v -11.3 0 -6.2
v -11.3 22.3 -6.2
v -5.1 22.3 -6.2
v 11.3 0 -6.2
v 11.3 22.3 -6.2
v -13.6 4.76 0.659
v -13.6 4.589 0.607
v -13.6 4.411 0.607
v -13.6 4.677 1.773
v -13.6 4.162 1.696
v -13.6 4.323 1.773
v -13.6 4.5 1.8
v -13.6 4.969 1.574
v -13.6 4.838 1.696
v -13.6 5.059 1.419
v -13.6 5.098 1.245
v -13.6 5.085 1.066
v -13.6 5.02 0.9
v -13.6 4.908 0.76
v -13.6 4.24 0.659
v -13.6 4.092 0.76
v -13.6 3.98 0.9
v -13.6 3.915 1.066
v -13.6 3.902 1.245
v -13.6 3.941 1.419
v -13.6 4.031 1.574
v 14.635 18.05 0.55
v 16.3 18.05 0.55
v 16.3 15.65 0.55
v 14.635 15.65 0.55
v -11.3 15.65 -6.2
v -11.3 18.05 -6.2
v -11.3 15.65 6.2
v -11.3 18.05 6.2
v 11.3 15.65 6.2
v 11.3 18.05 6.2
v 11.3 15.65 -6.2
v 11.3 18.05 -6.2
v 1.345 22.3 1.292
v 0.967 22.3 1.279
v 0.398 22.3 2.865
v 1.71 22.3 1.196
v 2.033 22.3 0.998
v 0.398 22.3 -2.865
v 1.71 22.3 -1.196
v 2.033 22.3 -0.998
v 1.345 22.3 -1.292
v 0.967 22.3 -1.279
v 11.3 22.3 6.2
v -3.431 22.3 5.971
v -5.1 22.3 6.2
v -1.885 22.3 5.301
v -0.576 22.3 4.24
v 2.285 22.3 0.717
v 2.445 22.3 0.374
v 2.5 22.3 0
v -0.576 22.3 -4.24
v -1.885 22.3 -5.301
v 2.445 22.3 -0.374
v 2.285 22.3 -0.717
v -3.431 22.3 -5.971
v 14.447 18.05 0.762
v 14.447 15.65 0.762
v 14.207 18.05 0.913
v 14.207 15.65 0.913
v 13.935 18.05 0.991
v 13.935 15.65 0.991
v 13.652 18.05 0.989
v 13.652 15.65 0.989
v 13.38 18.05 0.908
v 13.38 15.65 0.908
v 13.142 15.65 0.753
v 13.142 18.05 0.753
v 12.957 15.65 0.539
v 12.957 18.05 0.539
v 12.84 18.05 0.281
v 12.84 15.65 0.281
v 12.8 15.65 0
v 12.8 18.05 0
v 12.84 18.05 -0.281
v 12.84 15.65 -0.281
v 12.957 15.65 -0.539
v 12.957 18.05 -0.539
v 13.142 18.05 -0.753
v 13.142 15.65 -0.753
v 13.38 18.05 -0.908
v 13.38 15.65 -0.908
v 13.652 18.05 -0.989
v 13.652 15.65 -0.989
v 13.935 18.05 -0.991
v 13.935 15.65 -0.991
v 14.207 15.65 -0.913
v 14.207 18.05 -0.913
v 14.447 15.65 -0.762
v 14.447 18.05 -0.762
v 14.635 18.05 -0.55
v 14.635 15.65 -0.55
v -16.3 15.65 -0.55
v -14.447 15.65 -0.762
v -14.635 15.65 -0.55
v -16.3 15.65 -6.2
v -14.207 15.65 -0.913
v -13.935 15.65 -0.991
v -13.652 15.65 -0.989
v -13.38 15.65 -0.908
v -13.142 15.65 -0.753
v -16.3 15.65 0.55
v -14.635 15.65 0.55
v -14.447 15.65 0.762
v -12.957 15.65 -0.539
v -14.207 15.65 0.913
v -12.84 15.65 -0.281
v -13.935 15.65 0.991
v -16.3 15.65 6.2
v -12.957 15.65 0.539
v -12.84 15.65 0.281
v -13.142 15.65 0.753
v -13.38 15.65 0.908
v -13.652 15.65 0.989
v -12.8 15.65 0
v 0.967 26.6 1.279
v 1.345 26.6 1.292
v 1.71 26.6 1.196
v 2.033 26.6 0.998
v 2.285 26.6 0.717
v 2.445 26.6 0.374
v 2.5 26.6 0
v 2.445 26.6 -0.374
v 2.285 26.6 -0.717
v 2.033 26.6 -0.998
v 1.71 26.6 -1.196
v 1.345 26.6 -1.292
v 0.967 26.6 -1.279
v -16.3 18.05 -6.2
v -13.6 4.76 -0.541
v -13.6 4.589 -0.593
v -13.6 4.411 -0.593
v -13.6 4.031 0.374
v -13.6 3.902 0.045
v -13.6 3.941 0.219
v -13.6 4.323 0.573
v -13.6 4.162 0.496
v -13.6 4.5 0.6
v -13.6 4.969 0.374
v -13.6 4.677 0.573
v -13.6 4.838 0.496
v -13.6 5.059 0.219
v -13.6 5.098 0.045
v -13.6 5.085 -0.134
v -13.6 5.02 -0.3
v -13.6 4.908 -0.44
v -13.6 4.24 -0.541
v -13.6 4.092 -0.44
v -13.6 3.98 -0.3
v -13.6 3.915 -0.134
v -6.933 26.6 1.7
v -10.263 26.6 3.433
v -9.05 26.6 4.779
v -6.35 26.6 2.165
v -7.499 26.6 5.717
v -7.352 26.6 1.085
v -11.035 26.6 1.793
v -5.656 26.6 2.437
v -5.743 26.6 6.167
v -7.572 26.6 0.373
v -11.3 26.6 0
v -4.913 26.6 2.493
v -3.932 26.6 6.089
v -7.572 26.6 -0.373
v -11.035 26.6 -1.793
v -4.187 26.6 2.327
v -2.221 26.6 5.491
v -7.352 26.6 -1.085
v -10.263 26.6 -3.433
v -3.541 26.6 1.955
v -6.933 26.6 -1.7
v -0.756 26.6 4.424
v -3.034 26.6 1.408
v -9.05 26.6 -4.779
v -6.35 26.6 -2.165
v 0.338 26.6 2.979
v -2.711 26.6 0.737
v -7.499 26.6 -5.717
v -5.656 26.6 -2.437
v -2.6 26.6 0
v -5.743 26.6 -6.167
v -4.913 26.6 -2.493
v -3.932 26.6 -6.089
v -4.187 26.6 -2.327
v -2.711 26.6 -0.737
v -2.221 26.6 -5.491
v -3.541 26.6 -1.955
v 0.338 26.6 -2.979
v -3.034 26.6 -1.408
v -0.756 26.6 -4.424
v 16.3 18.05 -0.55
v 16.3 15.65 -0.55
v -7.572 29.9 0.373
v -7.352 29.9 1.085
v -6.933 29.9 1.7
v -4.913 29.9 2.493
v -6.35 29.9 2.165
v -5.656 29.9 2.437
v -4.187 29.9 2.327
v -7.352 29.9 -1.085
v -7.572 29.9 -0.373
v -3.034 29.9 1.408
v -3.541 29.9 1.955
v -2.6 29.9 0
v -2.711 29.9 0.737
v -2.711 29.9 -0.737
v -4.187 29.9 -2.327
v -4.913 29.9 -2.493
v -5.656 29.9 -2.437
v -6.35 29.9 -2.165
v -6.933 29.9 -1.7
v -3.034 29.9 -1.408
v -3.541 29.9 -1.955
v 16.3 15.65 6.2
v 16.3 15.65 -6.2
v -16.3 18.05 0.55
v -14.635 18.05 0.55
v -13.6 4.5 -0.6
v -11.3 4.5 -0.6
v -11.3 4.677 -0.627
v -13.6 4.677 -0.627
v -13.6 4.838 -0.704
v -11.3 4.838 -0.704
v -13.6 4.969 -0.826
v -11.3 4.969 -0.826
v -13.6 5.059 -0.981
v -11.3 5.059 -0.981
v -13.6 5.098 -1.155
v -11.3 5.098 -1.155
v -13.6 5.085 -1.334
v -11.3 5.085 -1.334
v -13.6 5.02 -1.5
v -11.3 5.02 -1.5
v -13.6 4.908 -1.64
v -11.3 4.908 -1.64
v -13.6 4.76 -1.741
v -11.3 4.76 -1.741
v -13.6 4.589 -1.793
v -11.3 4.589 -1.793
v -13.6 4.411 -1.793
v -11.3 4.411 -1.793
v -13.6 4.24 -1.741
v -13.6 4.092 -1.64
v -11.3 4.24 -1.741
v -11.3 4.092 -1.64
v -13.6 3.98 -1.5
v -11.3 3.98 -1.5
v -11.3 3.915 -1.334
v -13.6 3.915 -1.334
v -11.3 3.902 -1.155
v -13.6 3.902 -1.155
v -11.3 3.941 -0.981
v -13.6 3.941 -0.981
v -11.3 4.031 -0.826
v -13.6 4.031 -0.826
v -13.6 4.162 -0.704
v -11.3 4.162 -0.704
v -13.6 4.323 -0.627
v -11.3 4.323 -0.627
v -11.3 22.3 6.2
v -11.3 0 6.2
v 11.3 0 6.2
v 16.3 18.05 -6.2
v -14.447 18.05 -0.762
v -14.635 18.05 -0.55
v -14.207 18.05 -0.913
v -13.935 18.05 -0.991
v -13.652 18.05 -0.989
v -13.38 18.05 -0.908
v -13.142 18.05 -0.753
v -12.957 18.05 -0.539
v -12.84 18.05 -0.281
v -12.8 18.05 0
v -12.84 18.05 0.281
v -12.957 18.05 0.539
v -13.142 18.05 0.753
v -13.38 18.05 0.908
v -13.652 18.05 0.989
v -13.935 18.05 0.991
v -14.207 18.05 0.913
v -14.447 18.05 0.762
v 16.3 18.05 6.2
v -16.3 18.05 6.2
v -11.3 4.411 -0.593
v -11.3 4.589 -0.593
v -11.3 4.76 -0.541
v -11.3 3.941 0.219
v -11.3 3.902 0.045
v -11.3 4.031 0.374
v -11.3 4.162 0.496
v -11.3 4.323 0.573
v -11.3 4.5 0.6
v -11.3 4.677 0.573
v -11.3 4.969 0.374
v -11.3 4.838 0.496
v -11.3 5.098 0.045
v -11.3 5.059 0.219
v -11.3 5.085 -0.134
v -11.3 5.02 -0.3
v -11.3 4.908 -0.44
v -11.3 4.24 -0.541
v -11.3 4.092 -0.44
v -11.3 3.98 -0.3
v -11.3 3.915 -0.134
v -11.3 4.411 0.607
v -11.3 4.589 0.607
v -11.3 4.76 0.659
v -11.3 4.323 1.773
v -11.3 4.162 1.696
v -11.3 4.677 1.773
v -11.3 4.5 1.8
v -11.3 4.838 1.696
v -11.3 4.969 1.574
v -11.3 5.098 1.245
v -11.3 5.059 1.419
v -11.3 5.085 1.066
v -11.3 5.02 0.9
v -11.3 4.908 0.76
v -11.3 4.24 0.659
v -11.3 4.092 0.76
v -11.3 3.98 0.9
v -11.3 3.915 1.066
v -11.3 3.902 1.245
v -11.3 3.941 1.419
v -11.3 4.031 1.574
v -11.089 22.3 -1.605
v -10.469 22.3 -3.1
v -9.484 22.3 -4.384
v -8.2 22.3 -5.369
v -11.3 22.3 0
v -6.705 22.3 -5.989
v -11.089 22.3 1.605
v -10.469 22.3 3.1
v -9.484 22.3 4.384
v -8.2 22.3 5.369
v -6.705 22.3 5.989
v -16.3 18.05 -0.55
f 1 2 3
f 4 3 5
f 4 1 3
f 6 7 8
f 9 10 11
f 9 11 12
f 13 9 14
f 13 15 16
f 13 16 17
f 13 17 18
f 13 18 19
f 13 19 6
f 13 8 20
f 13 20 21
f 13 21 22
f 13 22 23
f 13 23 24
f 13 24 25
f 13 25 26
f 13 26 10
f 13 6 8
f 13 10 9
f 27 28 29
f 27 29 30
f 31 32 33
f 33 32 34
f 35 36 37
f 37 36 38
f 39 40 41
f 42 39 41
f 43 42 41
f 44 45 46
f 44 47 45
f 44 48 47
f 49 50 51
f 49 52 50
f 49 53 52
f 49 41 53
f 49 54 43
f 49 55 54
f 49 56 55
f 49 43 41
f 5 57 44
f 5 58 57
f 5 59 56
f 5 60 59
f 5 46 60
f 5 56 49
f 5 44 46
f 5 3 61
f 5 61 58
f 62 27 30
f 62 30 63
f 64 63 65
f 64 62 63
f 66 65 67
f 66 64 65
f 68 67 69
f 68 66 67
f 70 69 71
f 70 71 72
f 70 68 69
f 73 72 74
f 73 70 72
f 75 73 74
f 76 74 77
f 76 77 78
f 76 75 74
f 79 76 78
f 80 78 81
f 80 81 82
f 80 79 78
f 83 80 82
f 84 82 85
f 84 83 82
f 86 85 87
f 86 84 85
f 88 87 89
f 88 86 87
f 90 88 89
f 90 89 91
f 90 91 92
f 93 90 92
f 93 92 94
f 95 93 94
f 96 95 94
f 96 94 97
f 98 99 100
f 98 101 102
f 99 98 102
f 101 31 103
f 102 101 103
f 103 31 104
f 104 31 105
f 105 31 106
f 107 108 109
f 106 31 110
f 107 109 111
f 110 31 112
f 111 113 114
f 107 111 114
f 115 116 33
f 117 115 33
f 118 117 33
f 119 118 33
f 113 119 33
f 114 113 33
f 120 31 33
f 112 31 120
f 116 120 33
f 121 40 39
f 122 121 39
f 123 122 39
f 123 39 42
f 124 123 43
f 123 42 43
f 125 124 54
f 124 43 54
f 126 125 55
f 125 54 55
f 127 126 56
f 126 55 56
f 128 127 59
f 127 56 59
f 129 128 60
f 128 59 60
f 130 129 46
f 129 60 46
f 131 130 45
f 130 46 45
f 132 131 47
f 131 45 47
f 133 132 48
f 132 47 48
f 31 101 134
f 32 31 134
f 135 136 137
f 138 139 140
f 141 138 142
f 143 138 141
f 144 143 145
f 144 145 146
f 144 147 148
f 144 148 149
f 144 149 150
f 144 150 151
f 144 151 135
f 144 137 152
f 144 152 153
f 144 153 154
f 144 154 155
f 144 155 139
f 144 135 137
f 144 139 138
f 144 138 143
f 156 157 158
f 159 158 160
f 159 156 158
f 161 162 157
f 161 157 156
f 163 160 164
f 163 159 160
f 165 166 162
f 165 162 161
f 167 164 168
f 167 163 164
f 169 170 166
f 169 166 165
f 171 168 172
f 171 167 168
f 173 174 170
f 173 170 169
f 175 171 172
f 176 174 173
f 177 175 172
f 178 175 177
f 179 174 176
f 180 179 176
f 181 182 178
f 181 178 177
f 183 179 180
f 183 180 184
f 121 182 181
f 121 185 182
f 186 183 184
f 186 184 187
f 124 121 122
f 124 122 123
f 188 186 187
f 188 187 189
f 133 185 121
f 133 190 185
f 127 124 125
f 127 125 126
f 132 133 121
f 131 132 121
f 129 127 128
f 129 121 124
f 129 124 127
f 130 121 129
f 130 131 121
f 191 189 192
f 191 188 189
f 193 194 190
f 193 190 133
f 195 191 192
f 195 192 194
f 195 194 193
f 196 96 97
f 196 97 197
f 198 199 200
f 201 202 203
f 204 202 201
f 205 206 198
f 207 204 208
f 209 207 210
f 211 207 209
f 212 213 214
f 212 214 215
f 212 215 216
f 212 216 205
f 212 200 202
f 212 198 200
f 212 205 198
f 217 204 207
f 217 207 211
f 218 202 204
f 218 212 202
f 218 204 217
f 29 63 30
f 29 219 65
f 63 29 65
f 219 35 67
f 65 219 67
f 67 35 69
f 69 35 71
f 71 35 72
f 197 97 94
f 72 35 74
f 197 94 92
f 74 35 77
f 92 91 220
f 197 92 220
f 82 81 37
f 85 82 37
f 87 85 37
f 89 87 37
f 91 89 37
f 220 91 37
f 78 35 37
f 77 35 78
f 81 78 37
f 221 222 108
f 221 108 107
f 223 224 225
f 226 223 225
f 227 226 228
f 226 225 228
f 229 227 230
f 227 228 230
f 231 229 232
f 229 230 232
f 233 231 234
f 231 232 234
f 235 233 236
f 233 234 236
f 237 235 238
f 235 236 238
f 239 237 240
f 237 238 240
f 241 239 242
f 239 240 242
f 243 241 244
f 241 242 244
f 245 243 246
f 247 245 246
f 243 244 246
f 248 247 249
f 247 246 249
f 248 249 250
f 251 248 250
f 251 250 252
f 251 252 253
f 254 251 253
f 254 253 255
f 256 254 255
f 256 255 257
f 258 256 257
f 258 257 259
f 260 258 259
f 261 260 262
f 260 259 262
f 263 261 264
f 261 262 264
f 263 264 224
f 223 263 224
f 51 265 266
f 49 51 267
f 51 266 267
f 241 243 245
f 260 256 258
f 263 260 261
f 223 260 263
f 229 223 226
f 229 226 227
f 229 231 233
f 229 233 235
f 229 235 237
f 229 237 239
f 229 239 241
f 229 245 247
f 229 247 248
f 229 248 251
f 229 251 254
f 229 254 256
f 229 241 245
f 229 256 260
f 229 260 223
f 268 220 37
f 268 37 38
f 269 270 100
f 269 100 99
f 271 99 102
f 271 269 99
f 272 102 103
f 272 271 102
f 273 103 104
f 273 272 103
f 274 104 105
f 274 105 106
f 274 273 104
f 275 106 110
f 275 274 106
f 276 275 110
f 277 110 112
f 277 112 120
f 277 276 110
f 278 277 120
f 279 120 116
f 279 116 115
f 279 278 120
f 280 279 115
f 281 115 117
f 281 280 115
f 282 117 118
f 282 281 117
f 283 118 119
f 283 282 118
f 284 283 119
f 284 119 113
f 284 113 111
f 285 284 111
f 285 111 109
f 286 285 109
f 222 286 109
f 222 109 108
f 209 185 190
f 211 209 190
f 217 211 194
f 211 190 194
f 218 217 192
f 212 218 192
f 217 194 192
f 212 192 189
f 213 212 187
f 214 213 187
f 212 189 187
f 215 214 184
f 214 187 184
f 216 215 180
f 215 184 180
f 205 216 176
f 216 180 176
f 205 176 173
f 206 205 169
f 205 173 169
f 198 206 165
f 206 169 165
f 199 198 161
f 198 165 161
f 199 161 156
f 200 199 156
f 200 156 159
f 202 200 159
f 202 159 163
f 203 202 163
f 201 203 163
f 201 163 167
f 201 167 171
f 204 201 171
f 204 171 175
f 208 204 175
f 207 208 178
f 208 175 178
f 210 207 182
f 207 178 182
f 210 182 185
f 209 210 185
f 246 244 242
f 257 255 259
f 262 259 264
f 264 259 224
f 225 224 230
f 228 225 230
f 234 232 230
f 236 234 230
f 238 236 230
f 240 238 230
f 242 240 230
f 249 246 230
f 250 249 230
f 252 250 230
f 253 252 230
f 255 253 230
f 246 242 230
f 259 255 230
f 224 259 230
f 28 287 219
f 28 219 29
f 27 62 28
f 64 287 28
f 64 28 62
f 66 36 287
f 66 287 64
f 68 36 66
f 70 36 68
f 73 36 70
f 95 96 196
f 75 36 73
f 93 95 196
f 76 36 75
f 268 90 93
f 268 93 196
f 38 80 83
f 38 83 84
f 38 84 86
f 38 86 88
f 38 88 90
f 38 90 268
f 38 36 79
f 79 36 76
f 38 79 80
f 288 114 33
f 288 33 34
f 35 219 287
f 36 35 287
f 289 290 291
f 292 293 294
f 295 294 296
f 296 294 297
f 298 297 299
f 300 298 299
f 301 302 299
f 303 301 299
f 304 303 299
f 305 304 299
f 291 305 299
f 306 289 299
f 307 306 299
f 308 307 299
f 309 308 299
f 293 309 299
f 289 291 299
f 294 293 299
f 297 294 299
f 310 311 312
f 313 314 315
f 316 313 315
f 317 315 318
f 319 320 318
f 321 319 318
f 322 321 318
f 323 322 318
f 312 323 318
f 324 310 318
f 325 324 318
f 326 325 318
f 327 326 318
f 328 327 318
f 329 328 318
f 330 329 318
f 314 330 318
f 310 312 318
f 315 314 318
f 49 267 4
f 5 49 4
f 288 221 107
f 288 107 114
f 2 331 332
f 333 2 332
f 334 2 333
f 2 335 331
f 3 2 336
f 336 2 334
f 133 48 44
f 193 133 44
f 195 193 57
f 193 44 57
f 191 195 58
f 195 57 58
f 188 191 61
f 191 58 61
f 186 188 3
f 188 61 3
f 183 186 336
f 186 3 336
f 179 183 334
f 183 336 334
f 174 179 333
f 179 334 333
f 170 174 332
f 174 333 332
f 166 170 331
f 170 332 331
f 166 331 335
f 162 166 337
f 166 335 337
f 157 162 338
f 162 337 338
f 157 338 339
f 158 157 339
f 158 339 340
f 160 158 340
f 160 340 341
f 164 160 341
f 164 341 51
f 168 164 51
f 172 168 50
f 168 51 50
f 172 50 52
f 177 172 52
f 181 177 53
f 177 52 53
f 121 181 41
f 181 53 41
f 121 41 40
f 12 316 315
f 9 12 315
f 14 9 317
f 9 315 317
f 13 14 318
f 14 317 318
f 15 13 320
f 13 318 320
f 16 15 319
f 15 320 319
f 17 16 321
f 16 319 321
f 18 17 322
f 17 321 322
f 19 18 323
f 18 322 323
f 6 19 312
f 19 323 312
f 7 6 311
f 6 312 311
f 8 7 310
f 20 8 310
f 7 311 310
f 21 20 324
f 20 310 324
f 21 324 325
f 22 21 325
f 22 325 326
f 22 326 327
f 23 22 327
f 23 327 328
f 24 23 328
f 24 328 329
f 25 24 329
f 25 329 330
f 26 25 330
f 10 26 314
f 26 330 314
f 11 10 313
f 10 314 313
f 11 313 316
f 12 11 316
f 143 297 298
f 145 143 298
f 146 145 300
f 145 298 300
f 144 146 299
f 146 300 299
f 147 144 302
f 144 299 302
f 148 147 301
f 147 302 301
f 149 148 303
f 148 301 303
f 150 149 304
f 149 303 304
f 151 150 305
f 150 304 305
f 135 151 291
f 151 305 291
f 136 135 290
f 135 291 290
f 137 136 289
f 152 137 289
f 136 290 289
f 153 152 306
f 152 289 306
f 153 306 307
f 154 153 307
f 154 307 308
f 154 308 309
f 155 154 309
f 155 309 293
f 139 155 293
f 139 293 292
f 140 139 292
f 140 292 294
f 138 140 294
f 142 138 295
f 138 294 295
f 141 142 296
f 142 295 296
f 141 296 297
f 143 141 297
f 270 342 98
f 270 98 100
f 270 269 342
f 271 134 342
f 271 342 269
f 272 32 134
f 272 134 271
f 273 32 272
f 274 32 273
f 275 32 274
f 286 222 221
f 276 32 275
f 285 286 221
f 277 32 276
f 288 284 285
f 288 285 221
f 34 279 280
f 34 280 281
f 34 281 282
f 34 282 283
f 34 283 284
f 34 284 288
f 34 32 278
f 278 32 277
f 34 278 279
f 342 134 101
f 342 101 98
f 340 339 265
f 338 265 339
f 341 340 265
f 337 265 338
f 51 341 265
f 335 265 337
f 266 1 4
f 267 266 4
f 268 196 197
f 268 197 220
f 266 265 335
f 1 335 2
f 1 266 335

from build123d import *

# Parameters (mm, degrees)
SKETCH1_W             = 22.6
SKETCH1_H             = 12.4
BOSS_EXTRUDE1_DEPTH   = 22.3
SKETCH2_W             = 12.4
SKETCH2_H             = 2.4
BOSS_EXTRUDE2_DEPTH   = 5
SKETCH3_W             = 12.4
SKETCH3_H             = 2.4
BOSS_EXTRUDE3_DEPTH   = 5
CUT_EXTRUDE1_DEPTH    = 2.4
CUT_EXTRUDE2_DEPTH    = 2.4
BOSS_EXTRUDE4_DEPTH   = 4.3
SKETCH7_R             = 2.5
BOSS_EXTRUDE5_DEPTH   = 3.3
SKETCH8_R             = 0.6
BOSS_EXTRUDE7_DEPTH   = 2.3
BOSS_EXTRUDE7_2_DEPTH = 2.3
BOSS_EXTRUDE7_3_DEPTH = 2.3


with BuildPart() as part:
    # Sketch1 → Boss-Extrude1 (new body)
    with BuildSketch(Plane(origin=(0, 0, 0), x_dir=(1, 0, 0), z_dir=(0, 1, 0))):
        Rectangle(SKETCH1_W, SKETCH1_H)
    extrude(amount=BOSS_EXTRUDE1_DEPTH)

    # Sketch6 → Boss-Extrude4 (add)
    with BuildSketch(Plane(origin=(0, 22.3, 0), x_dir=(1, 0, 0), z_dir=(0, 1, 0))):
        with BuildLine():
            ThreePointArc((0.966666667, -1.278888406), (2.5, 0), (0.966666667, 1.278888406))
            ThreePointArc((0.966666667, 1.278888406), (-11.3, 0), (0.966666667, -1.278888406))
        make_face()
    extrude(amount=BOSS_EXTRUDE4_DEPTH)

    # Sketch7 → Boss-Extrude5 (add)
    with BuildSketch(Plane(origin=(0, 26.6, 0), x_dir=(1, 0, 0), z_dir=(0, 1, 0))):
        with Locations((-5.1, 0)):
            Circle(SKETCH7_R)
    extrude(amount=BOSS_EXTRUDE5_DEPTH)


with BuildPart() as body_2:
    # Sketch2 → Boss-Extrude2 (new body)
    with BuildSketch(Plane(origin=(11.3, 0, 0), x_dir=(0, 0, -1), z_dir=(1, 0, 0))):
        with Locations((0, 16.85)):
            Rectangle(SKETCH2_W, SKETCH2_H)
    extrude(amount=BOSS_EXTRUDE2_DEPTH)

    # Sketch5 → Cut-Extrude2 (cut)
    with BuildSketch(Plane(origin=(0, 18.05, 0), x_dir=(1, 0, 0), z_dir=(0, 1, 0))):
        with BuildLine():
            Line((14.635164654, 0.55), (16.3, 0.55))
            Line((16.3, 0.55), (16.3, -0.55))
            Line((16.3, -0.55), (14.635164654, -0.55))
            ThreePointArc((14.635164654, -0.55), (12.8, 0), (14.635164654, 0.55))
        make_face()
    extrude(amount=-CUT_EXTRUDE2_DEPTH, mode=Mode.SUBTRACT)


with BuildPart() as body_3:
    # Sketch3 → Boss-Extrude3 (new body)
    with BuildSketch(Plane.ZY.offset(11.3)):
        with Locations((0, 16.85)):
            Rectangle(SKETCH3_W, SKETCH3_H)
    extrude(amount=BOSS_EXTRUDE3_DEPTH)

    # Sketch4 → Cut-Extrude1 (cut)
    with BuildSketch(Plane(origin=(0, 18.05, 0), x_dir=(1, 0, 0), z_dir=(0, 1, 0))):
        with BuildLine():
            Line((-16.3, 0.55), (-14.635164654, 0.55))
            ThreePointArc((-14.635164654, 0.55), (-12.8, 0), (-14.635164654, -0.55))
            Line((-14.635164654, -0.55), (-16.3, -0.55))
            Line((-16.3, -0.55), (-16.3, 0.55))
        make_face()
        with BuildLine():
            Line((16.3, -0.55), (14.635164654, -0.55))
            ThreePointArc((14.635164654, -0.55), (12.8, 0), (14.635164654, 0.55))
            Line((14.635164654, 0.55), (16.3, 0.55))
            Line((16.3, 0.55), (16.3, -0.55))
        make_face()
    extrude(amount=-CUT_EXTRUDE1_DEPTH, mode=Mode.SUBTRACT)


with BuildPart() as body_4:
    # Sketch8 → Boss-Extrude7 (new body)
    with BuildSketch(Plane.ZY.offset(11.3)):
        with Locations((0, 4.5)):
            Circle(SKETCH8_R)
    extrude(amount=BOSS_EXTRUDE7_DEPTH)


with BuildPart() as body_5:
    # Sketch8 → Boss-Extrude7 2 (new body)
    with BuildSketch(Plane.ZY.offset(11.3)):
        with Locations((-1.2, 4.5)):
            Circle(SKETCH8_R)
    extrude(amount=BOSS_EXTRUDE7_2_DEPTH)


with BuildPart() as body_6:
    # Sketch8 → Boss-Extrude7 3 (new body)
    with BuildSketch(Plane.ZY.offset(11.3)):
        with Locations((1.2, 4.5)):
            Circle(SKETCH8_R)
    extrude(amount=BOSS_EXTRUDE7_3_DEPTH)


solid = Compound([part.part, body_2.part, body_3.part, body_4.part, body_5.part, body_6.part])
